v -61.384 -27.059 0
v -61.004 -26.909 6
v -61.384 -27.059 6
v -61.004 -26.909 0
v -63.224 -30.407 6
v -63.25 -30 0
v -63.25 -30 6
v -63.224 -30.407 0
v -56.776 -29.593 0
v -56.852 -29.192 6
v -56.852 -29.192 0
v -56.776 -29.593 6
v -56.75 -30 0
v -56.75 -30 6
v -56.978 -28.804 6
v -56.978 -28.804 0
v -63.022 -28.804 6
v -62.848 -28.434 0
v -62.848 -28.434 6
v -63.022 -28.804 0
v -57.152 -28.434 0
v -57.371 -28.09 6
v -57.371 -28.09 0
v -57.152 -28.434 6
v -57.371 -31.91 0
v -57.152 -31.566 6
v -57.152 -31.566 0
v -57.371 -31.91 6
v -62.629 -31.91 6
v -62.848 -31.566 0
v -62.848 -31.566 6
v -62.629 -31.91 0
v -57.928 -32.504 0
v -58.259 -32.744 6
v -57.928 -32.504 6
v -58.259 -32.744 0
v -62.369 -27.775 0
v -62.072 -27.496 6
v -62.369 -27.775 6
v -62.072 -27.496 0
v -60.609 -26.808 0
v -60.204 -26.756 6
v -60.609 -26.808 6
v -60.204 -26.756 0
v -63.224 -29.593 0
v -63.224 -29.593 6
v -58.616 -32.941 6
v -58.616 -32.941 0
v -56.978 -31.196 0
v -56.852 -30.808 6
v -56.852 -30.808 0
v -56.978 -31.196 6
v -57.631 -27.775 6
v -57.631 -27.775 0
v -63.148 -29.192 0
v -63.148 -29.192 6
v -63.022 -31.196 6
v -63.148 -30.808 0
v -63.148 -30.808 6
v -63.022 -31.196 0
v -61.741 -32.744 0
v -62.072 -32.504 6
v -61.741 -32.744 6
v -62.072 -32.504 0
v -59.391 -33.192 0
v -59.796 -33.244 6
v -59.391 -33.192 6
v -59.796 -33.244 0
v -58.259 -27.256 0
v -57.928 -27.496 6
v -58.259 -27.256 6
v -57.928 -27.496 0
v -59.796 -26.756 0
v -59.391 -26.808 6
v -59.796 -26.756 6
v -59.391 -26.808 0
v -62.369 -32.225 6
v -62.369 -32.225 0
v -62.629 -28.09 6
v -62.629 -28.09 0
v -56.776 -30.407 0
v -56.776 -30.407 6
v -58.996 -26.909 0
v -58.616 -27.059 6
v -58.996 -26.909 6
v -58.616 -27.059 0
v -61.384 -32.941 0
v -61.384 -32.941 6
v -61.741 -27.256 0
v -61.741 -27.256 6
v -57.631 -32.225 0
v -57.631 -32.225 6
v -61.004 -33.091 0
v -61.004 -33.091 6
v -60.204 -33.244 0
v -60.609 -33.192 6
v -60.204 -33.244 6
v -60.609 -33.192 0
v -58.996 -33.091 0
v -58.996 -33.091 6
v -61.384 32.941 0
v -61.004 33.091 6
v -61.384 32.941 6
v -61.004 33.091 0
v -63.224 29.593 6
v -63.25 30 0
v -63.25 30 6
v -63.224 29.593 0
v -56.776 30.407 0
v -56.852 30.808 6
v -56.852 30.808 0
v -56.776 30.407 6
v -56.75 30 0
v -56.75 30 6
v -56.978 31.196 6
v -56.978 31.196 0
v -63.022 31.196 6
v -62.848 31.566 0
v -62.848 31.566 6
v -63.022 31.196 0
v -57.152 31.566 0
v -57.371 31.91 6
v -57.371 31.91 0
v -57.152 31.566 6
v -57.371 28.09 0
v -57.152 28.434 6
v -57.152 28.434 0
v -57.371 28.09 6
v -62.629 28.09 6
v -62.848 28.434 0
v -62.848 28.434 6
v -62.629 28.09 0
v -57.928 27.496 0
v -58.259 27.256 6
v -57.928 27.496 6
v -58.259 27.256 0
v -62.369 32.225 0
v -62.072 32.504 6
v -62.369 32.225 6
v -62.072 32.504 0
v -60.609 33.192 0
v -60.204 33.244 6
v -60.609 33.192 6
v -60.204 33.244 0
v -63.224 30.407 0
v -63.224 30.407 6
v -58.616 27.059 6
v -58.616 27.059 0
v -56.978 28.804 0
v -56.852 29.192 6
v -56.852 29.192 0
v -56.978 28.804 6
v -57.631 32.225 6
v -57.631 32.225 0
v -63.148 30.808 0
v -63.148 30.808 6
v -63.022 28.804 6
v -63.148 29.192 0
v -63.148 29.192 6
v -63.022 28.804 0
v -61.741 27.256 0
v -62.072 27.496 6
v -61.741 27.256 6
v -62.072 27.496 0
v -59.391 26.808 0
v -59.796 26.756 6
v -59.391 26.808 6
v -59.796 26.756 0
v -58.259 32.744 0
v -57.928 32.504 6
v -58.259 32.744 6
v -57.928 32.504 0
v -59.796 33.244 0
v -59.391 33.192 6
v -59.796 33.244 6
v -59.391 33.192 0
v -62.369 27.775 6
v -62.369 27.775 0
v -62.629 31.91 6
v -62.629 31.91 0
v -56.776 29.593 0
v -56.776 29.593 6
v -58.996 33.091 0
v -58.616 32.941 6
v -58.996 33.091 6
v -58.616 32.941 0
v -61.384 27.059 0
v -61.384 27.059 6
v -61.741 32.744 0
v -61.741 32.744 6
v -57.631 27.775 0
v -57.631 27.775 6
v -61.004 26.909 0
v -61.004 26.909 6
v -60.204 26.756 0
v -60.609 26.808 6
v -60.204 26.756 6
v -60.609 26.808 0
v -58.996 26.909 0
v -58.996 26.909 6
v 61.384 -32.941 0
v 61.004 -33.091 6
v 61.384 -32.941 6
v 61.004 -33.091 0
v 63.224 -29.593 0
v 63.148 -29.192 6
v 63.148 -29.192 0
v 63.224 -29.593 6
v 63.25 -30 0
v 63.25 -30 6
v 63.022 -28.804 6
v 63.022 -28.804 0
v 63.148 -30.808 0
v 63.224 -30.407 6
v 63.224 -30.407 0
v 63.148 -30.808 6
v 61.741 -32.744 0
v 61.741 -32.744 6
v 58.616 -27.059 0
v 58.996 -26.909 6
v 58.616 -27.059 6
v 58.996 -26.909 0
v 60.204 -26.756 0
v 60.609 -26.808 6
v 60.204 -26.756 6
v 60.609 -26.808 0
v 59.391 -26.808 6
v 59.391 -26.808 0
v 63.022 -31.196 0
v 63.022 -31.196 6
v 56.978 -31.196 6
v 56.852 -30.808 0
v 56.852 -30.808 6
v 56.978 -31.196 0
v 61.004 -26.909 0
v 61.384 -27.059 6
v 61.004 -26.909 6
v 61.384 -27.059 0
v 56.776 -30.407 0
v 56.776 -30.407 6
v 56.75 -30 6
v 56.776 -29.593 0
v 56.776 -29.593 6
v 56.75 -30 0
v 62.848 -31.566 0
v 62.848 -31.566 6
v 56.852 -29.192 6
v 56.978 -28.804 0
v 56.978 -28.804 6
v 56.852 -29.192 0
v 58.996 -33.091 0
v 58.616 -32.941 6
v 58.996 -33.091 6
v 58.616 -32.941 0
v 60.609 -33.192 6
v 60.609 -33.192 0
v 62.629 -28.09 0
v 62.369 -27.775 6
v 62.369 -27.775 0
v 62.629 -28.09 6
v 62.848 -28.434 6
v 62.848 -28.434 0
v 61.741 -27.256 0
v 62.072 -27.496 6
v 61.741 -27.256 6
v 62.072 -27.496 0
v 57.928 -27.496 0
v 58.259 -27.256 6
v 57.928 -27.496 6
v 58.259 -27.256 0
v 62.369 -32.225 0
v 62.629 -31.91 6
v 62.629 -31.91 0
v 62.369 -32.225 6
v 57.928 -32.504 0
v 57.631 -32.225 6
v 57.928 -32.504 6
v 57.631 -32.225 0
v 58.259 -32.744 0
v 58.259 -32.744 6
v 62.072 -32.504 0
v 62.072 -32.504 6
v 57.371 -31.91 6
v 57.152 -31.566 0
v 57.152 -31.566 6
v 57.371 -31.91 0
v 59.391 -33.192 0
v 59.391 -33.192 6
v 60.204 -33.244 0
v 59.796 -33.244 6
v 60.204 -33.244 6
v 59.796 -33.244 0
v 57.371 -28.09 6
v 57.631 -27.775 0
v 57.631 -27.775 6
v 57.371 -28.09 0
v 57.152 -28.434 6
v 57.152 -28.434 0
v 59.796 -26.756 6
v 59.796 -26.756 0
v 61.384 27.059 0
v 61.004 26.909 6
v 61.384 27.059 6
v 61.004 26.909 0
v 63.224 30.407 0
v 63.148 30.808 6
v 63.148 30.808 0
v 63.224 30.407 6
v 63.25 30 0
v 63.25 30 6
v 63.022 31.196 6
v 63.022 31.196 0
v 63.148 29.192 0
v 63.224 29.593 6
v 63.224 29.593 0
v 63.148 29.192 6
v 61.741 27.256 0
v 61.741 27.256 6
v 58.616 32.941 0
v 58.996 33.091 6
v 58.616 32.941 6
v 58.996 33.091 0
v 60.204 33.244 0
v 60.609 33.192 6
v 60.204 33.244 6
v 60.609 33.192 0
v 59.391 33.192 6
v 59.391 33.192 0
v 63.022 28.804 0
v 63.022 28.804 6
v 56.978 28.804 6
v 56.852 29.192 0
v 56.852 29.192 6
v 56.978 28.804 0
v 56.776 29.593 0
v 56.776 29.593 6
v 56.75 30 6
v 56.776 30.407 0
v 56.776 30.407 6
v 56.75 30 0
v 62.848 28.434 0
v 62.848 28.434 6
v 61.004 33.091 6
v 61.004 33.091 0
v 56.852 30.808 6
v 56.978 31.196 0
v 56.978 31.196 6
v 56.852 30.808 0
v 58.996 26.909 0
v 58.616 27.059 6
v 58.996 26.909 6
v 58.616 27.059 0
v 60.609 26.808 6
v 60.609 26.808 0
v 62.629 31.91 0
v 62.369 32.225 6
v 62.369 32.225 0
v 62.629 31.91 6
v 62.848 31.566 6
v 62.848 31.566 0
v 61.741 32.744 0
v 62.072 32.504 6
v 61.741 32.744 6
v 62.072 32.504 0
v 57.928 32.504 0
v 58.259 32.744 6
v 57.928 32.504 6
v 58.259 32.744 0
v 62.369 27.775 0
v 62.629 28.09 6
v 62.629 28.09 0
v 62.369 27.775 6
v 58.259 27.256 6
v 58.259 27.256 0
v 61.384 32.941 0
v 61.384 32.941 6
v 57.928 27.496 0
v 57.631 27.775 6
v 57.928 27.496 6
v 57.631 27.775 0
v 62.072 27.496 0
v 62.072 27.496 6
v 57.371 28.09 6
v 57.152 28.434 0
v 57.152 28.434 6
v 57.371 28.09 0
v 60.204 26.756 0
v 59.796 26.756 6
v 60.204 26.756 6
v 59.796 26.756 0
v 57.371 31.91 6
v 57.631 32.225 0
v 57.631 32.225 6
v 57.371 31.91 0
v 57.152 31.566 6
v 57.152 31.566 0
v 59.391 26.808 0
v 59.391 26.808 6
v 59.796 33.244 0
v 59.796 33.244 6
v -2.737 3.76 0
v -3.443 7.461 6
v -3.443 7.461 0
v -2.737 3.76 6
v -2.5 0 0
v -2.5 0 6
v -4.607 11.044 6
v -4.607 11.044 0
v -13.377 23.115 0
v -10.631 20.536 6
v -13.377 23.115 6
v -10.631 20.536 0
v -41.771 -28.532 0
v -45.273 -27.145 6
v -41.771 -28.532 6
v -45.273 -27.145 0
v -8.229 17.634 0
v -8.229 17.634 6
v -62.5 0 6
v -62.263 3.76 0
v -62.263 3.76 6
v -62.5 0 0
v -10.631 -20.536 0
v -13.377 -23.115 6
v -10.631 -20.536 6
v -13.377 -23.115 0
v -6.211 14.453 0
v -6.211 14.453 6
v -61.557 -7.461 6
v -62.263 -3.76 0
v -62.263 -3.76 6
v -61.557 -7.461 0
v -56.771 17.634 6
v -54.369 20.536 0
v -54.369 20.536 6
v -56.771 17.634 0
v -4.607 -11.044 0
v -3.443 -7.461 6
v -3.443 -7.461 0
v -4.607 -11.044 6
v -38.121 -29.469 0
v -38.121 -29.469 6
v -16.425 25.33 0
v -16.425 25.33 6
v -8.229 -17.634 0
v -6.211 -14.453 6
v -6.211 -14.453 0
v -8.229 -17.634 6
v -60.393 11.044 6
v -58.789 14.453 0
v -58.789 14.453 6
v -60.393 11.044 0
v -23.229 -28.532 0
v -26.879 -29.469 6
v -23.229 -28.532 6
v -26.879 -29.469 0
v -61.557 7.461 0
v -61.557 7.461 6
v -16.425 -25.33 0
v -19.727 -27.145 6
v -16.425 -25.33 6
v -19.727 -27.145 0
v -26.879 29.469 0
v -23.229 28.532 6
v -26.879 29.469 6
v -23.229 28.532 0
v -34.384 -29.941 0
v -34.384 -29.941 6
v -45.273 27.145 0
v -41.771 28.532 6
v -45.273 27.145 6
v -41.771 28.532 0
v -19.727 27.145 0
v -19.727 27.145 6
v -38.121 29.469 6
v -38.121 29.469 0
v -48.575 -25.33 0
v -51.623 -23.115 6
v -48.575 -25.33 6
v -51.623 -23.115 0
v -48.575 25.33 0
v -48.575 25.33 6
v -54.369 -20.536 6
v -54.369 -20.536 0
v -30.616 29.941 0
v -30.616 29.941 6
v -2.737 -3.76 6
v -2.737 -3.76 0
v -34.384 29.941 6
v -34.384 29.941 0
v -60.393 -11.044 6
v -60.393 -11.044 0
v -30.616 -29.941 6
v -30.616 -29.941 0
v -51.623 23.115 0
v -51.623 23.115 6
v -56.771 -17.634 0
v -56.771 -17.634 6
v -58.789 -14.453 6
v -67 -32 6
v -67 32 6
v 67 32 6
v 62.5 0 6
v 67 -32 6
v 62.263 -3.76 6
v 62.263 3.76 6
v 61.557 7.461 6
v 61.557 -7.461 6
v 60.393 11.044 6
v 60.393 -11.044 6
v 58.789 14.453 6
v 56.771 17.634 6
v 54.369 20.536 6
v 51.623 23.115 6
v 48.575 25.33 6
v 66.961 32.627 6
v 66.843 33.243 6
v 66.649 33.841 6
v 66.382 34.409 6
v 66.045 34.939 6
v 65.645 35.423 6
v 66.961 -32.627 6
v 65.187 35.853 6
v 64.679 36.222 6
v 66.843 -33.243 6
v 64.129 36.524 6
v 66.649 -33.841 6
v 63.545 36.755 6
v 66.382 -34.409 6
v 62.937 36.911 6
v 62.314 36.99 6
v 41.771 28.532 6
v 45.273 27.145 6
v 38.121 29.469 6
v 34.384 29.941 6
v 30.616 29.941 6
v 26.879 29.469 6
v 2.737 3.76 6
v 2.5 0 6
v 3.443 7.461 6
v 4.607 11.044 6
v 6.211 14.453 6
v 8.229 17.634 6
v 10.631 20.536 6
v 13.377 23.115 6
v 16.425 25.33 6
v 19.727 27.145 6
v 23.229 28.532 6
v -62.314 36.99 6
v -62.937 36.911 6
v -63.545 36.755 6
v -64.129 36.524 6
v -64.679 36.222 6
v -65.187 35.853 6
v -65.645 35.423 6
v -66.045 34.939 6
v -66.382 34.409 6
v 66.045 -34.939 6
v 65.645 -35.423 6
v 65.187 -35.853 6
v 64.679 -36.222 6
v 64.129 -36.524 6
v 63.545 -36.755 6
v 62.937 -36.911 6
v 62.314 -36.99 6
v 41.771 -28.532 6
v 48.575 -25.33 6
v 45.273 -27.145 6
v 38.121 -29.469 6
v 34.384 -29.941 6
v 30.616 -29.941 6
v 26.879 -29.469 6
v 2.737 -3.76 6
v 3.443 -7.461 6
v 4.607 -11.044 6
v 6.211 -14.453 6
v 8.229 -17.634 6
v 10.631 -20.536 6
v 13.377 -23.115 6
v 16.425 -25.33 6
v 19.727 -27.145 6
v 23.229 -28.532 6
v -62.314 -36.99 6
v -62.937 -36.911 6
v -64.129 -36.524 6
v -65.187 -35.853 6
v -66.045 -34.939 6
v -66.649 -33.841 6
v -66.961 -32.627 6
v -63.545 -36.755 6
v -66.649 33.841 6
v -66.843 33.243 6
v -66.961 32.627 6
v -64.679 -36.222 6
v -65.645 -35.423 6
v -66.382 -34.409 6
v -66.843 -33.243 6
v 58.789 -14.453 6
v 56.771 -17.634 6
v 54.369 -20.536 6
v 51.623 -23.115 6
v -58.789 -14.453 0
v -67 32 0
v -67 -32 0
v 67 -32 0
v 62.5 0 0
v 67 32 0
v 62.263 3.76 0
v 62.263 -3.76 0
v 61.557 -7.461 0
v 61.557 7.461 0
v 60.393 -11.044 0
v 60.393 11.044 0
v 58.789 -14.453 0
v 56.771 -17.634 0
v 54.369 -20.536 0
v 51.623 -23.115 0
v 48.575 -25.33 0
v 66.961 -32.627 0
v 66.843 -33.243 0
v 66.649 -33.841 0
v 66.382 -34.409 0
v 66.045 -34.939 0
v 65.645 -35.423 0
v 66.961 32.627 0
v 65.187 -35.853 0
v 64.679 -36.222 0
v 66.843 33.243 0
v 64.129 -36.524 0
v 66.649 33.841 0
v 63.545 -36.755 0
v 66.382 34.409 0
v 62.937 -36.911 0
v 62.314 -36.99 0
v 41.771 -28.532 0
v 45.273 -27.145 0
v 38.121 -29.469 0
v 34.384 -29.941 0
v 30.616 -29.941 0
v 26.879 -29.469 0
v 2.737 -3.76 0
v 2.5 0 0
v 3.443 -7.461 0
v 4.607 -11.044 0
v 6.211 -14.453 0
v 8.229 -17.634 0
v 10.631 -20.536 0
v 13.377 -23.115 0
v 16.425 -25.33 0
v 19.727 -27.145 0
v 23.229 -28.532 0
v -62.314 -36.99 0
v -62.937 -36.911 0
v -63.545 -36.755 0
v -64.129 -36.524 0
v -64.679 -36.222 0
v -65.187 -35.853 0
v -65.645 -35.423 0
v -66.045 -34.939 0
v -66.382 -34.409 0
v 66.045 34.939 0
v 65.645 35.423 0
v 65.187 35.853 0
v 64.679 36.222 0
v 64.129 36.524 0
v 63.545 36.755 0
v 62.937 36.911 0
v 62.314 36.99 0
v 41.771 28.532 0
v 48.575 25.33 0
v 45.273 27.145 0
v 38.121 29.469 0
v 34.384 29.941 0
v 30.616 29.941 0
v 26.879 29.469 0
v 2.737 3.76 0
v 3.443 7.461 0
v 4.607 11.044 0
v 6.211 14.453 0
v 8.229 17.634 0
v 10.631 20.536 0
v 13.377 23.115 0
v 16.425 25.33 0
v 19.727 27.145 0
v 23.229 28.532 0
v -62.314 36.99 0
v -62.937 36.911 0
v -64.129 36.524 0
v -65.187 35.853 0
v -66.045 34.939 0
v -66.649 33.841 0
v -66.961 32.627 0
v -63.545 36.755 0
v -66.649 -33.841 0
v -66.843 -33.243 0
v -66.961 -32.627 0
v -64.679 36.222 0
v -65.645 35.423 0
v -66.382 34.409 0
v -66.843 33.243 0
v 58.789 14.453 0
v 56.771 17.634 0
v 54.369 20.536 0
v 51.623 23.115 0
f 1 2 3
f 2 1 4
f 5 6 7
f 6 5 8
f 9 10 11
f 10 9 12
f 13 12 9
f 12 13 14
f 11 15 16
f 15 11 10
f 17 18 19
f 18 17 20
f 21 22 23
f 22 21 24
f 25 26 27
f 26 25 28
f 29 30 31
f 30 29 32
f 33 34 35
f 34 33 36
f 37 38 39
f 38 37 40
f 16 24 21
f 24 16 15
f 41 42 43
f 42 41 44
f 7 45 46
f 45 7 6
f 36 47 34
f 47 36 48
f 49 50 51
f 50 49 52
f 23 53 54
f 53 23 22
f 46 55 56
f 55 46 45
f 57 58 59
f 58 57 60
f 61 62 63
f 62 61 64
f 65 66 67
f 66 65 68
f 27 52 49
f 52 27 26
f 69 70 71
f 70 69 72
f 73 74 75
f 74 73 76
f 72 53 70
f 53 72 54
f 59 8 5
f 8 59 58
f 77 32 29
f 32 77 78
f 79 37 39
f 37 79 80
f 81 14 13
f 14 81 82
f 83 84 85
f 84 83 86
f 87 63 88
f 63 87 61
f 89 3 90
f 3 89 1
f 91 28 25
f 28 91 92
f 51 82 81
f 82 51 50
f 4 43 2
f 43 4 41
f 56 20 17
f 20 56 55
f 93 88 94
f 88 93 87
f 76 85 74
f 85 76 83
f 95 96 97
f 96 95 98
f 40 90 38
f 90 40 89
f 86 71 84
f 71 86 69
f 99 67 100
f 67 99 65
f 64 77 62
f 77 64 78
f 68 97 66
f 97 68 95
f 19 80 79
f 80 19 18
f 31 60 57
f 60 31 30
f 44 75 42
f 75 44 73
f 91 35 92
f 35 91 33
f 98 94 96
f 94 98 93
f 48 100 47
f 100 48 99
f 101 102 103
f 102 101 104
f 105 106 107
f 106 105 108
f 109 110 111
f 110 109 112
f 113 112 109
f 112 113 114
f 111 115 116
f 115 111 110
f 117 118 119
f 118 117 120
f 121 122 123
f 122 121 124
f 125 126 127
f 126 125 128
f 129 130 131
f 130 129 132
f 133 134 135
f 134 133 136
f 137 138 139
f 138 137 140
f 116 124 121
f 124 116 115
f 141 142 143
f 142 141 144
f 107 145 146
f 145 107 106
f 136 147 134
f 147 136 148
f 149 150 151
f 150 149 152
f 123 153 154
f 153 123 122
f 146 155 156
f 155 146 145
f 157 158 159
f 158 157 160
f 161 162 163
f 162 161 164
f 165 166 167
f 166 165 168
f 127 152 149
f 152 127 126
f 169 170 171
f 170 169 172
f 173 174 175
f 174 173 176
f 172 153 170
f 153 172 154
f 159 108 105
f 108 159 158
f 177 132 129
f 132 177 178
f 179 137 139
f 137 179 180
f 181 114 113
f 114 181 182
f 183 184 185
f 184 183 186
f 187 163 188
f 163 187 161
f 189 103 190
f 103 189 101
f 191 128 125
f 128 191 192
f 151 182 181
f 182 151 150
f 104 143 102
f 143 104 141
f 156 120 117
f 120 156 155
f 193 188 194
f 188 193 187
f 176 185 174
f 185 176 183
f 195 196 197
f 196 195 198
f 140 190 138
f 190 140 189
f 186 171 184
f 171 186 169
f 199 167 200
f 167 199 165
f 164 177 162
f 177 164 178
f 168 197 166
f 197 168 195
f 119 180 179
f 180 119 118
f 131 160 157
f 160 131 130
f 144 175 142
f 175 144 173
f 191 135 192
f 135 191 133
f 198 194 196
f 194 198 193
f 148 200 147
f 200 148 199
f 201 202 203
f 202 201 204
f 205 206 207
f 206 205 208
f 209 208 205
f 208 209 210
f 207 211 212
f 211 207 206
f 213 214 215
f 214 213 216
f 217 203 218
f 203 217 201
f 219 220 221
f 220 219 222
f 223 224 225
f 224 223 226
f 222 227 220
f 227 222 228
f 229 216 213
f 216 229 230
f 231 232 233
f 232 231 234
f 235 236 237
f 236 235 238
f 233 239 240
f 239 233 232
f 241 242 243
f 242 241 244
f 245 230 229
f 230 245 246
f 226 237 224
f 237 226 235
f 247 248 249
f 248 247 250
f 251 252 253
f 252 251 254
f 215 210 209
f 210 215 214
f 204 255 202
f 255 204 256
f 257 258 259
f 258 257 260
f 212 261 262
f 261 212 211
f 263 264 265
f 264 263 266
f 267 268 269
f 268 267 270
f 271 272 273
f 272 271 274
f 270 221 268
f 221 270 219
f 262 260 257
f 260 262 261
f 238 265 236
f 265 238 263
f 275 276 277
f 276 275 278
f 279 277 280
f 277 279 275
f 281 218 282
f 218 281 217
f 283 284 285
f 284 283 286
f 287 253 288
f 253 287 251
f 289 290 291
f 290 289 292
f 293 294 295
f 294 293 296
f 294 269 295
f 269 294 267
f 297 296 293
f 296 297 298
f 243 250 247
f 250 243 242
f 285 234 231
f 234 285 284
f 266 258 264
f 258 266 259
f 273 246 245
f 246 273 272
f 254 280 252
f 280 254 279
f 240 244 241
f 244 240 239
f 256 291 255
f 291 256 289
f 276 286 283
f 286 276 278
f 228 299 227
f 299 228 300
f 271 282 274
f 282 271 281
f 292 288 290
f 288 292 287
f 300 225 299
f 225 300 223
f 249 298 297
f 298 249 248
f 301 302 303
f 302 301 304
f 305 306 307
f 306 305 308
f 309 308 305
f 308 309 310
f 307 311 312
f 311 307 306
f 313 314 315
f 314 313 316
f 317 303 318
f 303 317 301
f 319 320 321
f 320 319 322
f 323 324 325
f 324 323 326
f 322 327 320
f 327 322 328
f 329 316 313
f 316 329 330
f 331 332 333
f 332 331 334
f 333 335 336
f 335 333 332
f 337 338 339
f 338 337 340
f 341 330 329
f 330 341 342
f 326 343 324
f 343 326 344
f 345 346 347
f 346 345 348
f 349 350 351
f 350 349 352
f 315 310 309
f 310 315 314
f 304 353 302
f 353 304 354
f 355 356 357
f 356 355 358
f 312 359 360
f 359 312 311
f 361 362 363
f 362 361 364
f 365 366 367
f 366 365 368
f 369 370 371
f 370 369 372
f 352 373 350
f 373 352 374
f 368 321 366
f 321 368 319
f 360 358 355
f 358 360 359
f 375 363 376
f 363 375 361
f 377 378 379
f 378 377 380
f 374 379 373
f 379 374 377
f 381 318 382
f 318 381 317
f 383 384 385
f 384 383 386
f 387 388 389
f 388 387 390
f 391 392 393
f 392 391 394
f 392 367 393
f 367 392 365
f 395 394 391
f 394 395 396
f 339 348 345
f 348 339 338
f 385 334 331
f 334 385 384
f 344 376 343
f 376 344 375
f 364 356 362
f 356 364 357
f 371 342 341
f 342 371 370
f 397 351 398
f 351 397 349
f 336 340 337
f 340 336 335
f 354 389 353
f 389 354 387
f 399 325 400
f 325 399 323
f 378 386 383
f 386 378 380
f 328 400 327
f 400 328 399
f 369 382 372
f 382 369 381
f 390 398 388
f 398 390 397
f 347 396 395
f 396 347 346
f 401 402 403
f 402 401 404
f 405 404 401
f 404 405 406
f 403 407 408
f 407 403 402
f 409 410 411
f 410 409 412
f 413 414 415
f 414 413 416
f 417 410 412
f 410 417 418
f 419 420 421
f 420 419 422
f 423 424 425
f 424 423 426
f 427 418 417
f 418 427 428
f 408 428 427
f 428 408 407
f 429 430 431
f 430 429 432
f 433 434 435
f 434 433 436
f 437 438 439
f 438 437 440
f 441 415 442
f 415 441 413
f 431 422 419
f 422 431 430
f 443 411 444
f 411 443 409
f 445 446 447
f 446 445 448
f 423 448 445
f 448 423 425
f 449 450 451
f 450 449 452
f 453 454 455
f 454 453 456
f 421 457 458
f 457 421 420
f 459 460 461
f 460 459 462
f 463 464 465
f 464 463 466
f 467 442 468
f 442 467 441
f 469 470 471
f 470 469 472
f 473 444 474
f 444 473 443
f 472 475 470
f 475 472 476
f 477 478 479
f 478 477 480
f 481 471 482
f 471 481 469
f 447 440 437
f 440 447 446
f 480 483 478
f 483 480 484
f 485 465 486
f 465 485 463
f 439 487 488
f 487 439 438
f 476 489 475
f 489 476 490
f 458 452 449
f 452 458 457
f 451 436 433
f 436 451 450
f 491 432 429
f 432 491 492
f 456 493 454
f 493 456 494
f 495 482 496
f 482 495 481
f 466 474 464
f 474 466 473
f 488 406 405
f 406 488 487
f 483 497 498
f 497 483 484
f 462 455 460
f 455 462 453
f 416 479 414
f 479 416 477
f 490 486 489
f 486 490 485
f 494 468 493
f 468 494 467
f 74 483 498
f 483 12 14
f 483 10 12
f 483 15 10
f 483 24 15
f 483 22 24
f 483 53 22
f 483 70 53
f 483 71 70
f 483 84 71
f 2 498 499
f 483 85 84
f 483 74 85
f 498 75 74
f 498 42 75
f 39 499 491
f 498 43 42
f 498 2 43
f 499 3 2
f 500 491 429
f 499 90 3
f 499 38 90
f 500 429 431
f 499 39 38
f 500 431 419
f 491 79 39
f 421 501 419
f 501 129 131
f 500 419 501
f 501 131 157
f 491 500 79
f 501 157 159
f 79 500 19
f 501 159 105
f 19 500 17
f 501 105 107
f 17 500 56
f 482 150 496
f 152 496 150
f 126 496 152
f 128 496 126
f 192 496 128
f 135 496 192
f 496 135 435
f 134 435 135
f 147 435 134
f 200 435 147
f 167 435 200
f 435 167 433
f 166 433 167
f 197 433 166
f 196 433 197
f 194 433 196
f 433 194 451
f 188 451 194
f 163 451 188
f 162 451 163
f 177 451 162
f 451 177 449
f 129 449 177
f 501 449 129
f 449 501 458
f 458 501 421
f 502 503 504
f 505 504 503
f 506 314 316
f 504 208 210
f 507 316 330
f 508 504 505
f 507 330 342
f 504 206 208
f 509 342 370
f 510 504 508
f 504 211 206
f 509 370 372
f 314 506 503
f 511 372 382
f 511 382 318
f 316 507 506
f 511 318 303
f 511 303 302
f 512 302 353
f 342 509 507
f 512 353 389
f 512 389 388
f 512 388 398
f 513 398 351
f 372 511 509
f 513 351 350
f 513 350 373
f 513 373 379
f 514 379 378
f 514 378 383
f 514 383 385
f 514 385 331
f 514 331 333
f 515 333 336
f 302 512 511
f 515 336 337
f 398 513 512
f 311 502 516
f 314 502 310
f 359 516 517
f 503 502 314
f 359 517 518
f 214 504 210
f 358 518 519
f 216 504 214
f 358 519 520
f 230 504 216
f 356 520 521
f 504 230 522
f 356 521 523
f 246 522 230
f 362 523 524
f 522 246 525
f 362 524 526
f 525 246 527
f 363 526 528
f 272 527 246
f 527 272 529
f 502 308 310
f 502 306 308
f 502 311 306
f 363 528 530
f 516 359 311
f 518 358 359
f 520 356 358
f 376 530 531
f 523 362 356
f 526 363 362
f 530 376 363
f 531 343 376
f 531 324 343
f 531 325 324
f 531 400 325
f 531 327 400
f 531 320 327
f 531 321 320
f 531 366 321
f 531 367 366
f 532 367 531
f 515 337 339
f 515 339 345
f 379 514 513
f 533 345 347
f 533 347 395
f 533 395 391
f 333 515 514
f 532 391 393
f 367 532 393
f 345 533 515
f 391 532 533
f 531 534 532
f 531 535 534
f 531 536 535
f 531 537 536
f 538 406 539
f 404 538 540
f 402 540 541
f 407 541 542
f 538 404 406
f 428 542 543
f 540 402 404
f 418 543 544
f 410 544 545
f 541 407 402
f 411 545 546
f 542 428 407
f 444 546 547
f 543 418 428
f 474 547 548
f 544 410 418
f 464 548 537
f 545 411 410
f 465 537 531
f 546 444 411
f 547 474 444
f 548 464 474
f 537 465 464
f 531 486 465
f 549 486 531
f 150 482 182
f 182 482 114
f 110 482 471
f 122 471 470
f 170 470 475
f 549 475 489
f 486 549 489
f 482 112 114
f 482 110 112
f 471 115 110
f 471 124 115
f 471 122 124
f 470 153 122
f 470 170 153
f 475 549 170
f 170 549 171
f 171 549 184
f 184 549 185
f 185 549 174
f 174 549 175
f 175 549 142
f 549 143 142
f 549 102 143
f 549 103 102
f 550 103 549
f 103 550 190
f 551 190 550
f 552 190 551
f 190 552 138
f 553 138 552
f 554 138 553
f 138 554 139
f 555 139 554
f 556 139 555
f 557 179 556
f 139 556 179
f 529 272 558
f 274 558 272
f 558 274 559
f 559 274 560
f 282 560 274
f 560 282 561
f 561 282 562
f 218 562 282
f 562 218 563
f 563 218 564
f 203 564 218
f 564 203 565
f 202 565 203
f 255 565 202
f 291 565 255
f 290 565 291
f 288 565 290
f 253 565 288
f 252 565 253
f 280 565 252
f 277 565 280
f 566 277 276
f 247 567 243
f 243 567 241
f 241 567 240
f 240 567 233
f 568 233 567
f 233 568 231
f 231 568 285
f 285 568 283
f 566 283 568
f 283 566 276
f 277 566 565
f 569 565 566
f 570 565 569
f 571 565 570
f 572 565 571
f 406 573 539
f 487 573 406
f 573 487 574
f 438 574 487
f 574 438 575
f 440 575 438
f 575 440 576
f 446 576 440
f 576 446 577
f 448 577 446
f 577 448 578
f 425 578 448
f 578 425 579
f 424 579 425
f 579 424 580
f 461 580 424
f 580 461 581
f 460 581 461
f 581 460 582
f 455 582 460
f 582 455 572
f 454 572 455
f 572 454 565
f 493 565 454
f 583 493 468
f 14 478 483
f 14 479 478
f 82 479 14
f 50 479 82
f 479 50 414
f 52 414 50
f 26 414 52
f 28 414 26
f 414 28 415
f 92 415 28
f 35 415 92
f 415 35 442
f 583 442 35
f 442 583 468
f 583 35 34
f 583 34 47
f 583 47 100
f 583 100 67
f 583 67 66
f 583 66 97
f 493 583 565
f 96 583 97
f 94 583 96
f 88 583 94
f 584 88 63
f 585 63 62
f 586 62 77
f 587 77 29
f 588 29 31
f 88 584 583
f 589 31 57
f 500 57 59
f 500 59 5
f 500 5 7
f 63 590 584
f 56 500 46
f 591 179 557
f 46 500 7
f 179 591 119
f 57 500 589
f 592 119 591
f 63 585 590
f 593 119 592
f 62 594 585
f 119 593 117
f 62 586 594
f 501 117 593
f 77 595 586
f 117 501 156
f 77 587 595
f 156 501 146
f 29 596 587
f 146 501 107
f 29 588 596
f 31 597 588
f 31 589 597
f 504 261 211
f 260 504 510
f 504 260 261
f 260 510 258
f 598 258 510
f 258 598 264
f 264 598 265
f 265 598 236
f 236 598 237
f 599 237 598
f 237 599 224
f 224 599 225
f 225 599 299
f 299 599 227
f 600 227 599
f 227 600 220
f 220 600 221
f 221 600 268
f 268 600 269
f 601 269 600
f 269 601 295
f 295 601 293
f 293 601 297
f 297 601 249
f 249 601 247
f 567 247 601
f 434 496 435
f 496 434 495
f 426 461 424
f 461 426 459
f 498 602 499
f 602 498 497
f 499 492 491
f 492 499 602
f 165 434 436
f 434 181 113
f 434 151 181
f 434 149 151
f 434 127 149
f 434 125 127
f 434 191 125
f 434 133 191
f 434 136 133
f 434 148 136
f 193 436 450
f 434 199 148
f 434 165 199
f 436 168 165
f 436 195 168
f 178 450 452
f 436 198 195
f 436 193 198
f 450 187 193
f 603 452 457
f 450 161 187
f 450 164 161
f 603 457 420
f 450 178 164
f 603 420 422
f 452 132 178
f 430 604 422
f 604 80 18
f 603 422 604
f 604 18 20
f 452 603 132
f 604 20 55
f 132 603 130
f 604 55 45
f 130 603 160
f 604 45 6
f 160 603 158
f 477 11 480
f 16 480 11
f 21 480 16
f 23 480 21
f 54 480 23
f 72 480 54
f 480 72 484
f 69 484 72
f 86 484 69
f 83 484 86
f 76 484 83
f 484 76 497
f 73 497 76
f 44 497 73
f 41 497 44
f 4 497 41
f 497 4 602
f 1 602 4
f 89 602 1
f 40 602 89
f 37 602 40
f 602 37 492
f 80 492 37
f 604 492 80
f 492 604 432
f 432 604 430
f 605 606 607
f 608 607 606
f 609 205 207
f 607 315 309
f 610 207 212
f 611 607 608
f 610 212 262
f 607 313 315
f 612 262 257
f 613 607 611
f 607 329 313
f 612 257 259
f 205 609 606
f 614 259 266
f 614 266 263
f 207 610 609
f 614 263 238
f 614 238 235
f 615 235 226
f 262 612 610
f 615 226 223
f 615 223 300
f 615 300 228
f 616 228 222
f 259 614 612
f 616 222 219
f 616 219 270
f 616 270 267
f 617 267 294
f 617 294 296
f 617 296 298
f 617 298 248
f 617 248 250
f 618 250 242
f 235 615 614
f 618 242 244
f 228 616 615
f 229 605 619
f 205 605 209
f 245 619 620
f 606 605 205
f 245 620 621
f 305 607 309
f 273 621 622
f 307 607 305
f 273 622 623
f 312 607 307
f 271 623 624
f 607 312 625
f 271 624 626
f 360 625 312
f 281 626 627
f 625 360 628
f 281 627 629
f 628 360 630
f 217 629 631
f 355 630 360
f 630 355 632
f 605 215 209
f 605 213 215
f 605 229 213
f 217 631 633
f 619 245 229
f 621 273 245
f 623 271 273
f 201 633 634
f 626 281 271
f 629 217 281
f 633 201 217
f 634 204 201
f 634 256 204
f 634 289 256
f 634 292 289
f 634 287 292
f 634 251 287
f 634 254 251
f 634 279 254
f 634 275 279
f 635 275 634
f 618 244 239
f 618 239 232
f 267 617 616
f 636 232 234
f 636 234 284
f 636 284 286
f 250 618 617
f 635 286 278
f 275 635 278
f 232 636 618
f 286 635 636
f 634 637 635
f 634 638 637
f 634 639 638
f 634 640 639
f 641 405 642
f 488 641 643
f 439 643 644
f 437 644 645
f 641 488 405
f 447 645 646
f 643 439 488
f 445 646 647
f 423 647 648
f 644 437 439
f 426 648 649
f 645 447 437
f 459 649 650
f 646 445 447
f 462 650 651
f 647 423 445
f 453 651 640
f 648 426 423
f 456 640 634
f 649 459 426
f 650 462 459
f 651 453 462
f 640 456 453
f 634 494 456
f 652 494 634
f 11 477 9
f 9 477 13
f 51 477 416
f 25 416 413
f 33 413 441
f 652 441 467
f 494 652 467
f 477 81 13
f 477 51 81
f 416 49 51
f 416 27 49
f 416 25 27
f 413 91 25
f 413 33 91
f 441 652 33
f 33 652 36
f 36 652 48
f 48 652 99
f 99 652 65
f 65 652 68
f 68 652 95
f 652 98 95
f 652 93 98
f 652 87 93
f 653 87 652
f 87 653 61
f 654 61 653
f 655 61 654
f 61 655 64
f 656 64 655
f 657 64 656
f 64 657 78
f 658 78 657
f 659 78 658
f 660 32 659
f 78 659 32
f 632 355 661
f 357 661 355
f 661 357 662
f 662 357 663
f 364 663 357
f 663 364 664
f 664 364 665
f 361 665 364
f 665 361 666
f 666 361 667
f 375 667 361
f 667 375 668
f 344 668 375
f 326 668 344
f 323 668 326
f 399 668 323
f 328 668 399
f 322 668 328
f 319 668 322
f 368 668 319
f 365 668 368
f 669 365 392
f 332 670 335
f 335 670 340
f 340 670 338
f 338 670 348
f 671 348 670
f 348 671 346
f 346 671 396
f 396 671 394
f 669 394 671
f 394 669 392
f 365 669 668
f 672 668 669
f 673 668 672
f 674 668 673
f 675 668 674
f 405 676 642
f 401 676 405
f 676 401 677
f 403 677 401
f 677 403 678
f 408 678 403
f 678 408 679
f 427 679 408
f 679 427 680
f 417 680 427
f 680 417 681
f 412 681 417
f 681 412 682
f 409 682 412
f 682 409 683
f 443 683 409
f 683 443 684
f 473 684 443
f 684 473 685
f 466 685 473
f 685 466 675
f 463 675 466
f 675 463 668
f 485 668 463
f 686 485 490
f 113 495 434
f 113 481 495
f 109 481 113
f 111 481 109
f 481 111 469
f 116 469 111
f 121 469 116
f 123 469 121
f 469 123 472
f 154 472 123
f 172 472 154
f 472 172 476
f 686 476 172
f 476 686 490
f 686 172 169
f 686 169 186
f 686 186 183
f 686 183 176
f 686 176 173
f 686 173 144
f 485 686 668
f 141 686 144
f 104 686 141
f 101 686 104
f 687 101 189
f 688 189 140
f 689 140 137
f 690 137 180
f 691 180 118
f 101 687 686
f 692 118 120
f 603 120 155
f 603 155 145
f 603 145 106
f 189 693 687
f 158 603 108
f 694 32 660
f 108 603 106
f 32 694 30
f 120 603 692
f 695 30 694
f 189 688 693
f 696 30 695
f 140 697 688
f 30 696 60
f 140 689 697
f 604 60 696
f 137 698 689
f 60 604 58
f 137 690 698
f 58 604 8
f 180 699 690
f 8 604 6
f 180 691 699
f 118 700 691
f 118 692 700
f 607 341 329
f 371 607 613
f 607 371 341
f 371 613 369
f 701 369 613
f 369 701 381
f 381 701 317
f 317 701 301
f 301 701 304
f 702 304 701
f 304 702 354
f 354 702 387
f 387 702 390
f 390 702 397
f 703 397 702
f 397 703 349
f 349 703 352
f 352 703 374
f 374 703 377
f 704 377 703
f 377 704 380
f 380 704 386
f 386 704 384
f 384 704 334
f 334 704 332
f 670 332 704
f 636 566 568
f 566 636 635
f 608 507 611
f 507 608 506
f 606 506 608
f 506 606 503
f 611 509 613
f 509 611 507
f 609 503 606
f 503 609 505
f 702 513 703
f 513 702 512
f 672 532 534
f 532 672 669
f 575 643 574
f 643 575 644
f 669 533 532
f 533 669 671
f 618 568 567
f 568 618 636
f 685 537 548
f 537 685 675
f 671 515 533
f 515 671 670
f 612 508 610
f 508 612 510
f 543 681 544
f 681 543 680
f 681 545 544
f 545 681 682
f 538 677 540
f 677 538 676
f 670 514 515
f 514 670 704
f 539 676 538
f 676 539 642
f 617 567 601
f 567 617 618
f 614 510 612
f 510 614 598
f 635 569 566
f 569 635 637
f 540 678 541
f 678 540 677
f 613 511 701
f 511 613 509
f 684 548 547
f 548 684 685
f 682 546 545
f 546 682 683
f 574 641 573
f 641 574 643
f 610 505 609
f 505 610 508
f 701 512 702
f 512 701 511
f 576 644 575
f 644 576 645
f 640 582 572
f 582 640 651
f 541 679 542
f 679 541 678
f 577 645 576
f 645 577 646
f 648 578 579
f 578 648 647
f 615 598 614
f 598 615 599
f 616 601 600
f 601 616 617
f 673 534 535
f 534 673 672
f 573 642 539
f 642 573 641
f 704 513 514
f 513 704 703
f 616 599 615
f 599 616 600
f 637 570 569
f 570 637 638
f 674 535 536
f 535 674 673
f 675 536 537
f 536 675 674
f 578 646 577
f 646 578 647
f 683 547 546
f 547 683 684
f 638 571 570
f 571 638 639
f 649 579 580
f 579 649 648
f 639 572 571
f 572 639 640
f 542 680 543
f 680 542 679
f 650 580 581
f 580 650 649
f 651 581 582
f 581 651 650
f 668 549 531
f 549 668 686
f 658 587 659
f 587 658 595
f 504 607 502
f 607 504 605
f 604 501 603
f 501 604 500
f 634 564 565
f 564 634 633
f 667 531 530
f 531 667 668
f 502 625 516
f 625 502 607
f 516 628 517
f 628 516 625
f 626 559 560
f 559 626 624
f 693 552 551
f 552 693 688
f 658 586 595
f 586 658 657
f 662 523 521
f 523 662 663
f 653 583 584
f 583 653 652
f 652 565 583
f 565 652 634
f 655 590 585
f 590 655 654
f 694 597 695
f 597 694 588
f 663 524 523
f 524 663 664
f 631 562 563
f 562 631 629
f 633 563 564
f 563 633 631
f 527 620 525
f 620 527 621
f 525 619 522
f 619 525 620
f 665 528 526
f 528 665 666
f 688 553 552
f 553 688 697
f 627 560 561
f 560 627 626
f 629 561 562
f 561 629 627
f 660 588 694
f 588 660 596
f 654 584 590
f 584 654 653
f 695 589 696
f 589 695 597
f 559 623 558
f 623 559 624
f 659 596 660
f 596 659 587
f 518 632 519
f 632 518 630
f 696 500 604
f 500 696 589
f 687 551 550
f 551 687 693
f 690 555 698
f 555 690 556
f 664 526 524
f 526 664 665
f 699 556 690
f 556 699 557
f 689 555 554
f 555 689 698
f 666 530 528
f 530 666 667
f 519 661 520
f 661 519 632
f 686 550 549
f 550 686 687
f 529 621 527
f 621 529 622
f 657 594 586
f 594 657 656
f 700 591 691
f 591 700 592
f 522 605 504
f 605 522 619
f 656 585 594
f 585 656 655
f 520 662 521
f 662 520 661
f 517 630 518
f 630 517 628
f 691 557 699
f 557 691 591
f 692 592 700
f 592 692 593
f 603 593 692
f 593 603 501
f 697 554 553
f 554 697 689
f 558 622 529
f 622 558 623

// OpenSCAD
$fn = 50;


difference() {
	union() {
		hull() {
			translate(v = [-62.0000000000, 32.0000000000, 0]) {
				cylinder(h = 6, r = 5);
			}
			translate(v = [62.0000000000, 32.0000000000, 0]) {
				cylinder(h = 6, r = 5);
			}
			translate(v = [-62.0000000000, -32.0000000000, 0]) {
				cylinder(h = 6, r = 5);
			}
			translate(v = [62.0000000000, -32.0000000000, 0]) {
				cylinder(h = 6, r = 5);
			}
		}
	}
	union() {
		#translate(v = [-60.0000000000, -30.0000000000, -100.0000000000]) {
			cylinder(h = 200, r = 3.2500000000);
		}
		#translate(v = [-60.0000000000, 30.0000000000, -100.0000000000]) {
			cylinder(h = 200, r = 3.2500000000);
		}
		#translate(v = [60.0000000000, -30.0000000000, -100.0000000000]) {
			cylinder(h = 200, r = 3.2500000000);
		}
		#translate(v = [60.0000000000, 30.0000000000, -100.0000000000]) {
			cylinder(h = 200, r = 3.2500000000);
		}
		#translate(v = [-32.5000000000, 0, 0]) {
			cylinder(h = 6, r = 30.0000000000);
		}
		#translate(v = [32.5000000000, 0, 0]) {
			cylinder(h = 6, r = 30.0000000000);
		}
	}
}
